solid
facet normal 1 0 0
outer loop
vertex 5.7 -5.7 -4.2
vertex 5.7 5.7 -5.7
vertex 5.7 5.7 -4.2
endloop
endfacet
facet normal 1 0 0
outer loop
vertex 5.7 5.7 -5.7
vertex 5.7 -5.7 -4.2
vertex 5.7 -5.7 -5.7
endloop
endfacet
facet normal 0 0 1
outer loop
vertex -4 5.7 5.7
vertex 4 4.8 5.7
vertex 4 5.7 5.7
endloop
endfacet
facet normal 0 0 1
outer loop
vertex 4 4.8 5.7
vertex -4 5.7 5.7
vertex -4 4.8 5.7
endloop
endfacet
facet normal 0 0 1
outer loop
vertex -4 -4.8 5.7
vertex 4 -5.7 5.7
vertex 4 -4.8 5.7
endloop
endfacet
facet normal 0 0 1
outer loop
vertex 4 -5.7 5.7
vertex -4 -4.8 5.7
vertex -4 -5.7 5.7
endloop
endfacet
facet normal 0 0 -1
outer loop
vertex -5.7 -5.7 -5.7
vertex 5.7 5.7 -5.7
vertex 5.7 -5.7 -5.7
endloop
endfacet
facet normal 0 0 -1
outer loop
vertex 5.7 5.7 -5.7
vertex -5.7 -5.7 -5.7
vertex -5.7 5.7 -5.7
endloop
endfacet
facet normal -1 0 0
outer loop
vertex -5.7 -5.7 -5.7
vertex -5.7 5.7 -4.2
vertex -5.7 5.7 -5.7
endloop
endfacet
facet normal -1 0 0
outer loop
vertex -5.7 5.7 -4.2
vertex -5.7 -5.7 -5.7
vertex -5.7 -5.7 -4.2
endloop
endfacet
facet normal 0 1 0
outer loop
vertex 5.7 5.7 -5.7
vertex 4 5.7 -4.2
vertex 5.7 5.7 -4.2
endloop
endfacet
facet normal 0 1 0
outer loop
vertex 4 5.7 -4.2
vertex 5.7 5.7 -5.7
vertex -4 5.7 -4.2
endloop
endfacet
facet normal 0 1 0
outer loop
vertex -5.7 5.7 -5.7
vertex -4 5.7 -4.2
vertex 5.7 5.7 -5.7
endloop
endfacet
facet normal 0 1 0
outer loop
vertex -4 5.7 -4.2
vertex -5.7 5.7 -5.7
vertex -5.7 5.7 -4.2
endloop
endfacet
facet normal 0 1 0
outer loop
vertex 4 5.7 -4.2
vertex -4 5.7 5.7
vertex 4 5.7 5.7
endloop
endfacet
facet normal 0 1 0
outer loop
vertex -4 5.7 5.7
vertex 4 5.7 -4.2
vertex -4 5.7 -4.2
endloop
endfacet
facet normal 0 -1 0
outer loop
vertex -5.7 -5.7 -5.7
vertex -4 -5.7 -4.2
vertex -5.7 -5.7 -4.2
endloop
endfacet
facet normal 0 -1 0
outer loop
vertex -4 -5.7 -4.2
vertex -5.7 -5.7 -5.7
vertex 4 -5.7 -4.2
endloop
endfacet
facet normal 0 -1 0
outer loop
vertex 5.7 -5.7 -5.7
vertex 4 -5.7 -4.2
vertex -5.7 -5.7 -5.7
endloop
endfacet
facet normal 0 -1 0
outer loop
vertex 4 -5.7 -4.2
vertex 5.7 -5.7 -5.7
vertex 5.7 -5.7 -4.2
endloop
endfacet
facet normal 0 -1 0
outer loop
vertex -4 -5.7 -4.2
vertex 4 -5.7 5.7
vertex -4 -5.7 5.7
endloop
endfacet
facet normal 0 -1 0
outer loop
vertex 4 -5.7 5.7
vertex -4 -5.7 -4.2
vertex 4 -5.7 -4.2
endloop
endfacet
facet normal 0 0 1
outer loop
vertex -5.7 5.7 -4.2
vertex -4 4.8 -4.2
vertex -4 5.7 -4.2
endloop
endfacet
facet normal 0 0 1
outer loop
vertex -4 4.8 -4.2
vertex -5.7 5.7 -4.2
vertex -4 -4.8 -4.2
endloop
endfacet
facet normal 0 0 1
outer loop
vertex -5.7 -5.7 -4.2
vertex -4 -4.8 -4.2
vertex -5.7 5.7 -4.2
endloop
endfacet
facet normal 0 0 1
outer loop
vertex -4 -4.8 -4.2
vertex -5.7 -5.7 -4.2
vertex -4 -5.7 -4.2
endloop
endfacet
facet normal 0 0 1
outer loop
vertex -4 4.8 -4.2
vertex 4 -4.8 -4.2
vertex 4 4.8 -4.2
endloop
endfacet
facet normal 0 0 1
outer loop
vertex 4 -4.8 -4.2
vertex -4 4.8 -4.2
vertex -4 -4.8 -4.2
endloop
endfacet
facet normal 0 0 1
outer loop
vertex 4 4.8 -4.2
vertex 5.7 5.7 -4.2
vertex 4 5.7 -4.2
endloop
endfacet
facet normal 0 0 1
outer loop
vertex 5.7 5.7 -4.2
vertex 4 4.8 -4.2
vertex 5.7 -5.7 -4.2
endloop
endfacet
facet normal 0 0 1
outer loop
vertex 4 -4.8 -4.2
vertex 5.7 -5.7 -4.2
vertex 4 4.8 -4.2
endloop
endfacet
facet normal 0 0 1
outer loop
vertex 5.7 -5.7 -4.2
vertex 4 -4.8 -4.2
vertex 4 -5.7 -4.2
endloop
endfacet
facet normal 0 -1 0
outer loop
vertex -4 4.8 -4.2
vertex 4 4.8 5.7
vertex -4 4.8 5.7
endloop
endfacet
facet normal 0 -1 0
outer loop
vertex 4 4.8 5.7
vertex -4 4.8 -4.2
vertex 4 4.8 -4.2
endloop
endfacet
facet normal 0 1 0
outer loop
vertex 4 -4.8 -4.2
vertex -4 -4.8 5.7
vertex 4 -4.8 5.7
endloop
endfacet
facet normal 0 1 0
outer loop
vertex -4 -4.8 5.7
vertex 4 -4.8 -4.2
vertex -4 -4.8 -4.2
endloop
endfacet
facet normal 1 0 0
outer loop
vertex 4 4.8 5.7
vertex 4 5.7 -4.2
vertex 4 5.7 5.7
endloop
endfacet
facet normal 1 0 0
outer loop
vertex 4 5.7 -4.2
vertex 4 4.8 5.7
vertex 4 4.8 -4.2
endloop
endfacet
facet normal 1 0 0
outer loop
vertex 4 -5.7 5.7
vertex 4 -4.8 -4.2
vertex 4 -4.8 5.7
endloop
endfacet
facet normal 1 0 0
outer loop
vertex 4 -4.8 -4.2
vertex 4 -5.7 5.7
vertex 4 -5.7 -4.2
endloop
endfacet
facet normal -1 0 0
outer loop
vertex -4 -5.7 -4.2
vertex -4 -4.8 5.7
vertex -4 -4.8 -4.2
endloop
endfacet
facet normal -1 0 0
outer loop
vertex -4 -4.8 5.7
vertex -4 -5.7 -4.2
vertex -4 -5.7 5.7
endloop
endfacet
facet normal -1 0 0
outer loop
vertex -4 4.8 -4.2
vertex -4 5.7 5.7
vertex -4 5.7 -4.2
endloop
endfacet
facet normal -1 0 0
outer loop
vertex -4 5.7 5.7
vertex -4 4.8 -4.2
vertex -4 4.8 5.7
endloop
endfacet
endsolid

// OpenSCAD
module box(w,h,d,wall,t){
    difference(){
        //[width,depth,height]
        cube([w+wall+t,h+wall+t,d+wall+t], center=true); // outside
        translate([0,0,wall]) cube([w-t,h-t,d+t], center=true); // inside    
    }
}

module plug_holder(blockonly) {
    t = 0.4; //tolerance
    wall = 1;
    half_wall = wall*0.5; 
//    h = 12.82; //h
//    w = 6.75; //w
//    d = 8.77; //d
    h = 10;
    w = 10;
    d = 100;

    
    module plug_block(){
        cube([w+wall+t,d+wall+t,h+wall+t], center=true);   
    }
    
    module main() {
        box(w,h,h,wall,t);
    }
    
    module main_with_holes(){
        hole_d = d-wall+t;
        module hole(){
            cube([wall*2,hole_d,h+wall+t], center=true);
        }
        
        difference(){ 
            main();
            translate([w*.5 ,0,wall*1.5]) hole();
            translate([w*-.5,0,wall*1.5]) hole();
        }
    }
    if (blockonly) plug_block(wall);
            else  main_with_holes();
}
//plug_holder(true);
plug_holder(false);
